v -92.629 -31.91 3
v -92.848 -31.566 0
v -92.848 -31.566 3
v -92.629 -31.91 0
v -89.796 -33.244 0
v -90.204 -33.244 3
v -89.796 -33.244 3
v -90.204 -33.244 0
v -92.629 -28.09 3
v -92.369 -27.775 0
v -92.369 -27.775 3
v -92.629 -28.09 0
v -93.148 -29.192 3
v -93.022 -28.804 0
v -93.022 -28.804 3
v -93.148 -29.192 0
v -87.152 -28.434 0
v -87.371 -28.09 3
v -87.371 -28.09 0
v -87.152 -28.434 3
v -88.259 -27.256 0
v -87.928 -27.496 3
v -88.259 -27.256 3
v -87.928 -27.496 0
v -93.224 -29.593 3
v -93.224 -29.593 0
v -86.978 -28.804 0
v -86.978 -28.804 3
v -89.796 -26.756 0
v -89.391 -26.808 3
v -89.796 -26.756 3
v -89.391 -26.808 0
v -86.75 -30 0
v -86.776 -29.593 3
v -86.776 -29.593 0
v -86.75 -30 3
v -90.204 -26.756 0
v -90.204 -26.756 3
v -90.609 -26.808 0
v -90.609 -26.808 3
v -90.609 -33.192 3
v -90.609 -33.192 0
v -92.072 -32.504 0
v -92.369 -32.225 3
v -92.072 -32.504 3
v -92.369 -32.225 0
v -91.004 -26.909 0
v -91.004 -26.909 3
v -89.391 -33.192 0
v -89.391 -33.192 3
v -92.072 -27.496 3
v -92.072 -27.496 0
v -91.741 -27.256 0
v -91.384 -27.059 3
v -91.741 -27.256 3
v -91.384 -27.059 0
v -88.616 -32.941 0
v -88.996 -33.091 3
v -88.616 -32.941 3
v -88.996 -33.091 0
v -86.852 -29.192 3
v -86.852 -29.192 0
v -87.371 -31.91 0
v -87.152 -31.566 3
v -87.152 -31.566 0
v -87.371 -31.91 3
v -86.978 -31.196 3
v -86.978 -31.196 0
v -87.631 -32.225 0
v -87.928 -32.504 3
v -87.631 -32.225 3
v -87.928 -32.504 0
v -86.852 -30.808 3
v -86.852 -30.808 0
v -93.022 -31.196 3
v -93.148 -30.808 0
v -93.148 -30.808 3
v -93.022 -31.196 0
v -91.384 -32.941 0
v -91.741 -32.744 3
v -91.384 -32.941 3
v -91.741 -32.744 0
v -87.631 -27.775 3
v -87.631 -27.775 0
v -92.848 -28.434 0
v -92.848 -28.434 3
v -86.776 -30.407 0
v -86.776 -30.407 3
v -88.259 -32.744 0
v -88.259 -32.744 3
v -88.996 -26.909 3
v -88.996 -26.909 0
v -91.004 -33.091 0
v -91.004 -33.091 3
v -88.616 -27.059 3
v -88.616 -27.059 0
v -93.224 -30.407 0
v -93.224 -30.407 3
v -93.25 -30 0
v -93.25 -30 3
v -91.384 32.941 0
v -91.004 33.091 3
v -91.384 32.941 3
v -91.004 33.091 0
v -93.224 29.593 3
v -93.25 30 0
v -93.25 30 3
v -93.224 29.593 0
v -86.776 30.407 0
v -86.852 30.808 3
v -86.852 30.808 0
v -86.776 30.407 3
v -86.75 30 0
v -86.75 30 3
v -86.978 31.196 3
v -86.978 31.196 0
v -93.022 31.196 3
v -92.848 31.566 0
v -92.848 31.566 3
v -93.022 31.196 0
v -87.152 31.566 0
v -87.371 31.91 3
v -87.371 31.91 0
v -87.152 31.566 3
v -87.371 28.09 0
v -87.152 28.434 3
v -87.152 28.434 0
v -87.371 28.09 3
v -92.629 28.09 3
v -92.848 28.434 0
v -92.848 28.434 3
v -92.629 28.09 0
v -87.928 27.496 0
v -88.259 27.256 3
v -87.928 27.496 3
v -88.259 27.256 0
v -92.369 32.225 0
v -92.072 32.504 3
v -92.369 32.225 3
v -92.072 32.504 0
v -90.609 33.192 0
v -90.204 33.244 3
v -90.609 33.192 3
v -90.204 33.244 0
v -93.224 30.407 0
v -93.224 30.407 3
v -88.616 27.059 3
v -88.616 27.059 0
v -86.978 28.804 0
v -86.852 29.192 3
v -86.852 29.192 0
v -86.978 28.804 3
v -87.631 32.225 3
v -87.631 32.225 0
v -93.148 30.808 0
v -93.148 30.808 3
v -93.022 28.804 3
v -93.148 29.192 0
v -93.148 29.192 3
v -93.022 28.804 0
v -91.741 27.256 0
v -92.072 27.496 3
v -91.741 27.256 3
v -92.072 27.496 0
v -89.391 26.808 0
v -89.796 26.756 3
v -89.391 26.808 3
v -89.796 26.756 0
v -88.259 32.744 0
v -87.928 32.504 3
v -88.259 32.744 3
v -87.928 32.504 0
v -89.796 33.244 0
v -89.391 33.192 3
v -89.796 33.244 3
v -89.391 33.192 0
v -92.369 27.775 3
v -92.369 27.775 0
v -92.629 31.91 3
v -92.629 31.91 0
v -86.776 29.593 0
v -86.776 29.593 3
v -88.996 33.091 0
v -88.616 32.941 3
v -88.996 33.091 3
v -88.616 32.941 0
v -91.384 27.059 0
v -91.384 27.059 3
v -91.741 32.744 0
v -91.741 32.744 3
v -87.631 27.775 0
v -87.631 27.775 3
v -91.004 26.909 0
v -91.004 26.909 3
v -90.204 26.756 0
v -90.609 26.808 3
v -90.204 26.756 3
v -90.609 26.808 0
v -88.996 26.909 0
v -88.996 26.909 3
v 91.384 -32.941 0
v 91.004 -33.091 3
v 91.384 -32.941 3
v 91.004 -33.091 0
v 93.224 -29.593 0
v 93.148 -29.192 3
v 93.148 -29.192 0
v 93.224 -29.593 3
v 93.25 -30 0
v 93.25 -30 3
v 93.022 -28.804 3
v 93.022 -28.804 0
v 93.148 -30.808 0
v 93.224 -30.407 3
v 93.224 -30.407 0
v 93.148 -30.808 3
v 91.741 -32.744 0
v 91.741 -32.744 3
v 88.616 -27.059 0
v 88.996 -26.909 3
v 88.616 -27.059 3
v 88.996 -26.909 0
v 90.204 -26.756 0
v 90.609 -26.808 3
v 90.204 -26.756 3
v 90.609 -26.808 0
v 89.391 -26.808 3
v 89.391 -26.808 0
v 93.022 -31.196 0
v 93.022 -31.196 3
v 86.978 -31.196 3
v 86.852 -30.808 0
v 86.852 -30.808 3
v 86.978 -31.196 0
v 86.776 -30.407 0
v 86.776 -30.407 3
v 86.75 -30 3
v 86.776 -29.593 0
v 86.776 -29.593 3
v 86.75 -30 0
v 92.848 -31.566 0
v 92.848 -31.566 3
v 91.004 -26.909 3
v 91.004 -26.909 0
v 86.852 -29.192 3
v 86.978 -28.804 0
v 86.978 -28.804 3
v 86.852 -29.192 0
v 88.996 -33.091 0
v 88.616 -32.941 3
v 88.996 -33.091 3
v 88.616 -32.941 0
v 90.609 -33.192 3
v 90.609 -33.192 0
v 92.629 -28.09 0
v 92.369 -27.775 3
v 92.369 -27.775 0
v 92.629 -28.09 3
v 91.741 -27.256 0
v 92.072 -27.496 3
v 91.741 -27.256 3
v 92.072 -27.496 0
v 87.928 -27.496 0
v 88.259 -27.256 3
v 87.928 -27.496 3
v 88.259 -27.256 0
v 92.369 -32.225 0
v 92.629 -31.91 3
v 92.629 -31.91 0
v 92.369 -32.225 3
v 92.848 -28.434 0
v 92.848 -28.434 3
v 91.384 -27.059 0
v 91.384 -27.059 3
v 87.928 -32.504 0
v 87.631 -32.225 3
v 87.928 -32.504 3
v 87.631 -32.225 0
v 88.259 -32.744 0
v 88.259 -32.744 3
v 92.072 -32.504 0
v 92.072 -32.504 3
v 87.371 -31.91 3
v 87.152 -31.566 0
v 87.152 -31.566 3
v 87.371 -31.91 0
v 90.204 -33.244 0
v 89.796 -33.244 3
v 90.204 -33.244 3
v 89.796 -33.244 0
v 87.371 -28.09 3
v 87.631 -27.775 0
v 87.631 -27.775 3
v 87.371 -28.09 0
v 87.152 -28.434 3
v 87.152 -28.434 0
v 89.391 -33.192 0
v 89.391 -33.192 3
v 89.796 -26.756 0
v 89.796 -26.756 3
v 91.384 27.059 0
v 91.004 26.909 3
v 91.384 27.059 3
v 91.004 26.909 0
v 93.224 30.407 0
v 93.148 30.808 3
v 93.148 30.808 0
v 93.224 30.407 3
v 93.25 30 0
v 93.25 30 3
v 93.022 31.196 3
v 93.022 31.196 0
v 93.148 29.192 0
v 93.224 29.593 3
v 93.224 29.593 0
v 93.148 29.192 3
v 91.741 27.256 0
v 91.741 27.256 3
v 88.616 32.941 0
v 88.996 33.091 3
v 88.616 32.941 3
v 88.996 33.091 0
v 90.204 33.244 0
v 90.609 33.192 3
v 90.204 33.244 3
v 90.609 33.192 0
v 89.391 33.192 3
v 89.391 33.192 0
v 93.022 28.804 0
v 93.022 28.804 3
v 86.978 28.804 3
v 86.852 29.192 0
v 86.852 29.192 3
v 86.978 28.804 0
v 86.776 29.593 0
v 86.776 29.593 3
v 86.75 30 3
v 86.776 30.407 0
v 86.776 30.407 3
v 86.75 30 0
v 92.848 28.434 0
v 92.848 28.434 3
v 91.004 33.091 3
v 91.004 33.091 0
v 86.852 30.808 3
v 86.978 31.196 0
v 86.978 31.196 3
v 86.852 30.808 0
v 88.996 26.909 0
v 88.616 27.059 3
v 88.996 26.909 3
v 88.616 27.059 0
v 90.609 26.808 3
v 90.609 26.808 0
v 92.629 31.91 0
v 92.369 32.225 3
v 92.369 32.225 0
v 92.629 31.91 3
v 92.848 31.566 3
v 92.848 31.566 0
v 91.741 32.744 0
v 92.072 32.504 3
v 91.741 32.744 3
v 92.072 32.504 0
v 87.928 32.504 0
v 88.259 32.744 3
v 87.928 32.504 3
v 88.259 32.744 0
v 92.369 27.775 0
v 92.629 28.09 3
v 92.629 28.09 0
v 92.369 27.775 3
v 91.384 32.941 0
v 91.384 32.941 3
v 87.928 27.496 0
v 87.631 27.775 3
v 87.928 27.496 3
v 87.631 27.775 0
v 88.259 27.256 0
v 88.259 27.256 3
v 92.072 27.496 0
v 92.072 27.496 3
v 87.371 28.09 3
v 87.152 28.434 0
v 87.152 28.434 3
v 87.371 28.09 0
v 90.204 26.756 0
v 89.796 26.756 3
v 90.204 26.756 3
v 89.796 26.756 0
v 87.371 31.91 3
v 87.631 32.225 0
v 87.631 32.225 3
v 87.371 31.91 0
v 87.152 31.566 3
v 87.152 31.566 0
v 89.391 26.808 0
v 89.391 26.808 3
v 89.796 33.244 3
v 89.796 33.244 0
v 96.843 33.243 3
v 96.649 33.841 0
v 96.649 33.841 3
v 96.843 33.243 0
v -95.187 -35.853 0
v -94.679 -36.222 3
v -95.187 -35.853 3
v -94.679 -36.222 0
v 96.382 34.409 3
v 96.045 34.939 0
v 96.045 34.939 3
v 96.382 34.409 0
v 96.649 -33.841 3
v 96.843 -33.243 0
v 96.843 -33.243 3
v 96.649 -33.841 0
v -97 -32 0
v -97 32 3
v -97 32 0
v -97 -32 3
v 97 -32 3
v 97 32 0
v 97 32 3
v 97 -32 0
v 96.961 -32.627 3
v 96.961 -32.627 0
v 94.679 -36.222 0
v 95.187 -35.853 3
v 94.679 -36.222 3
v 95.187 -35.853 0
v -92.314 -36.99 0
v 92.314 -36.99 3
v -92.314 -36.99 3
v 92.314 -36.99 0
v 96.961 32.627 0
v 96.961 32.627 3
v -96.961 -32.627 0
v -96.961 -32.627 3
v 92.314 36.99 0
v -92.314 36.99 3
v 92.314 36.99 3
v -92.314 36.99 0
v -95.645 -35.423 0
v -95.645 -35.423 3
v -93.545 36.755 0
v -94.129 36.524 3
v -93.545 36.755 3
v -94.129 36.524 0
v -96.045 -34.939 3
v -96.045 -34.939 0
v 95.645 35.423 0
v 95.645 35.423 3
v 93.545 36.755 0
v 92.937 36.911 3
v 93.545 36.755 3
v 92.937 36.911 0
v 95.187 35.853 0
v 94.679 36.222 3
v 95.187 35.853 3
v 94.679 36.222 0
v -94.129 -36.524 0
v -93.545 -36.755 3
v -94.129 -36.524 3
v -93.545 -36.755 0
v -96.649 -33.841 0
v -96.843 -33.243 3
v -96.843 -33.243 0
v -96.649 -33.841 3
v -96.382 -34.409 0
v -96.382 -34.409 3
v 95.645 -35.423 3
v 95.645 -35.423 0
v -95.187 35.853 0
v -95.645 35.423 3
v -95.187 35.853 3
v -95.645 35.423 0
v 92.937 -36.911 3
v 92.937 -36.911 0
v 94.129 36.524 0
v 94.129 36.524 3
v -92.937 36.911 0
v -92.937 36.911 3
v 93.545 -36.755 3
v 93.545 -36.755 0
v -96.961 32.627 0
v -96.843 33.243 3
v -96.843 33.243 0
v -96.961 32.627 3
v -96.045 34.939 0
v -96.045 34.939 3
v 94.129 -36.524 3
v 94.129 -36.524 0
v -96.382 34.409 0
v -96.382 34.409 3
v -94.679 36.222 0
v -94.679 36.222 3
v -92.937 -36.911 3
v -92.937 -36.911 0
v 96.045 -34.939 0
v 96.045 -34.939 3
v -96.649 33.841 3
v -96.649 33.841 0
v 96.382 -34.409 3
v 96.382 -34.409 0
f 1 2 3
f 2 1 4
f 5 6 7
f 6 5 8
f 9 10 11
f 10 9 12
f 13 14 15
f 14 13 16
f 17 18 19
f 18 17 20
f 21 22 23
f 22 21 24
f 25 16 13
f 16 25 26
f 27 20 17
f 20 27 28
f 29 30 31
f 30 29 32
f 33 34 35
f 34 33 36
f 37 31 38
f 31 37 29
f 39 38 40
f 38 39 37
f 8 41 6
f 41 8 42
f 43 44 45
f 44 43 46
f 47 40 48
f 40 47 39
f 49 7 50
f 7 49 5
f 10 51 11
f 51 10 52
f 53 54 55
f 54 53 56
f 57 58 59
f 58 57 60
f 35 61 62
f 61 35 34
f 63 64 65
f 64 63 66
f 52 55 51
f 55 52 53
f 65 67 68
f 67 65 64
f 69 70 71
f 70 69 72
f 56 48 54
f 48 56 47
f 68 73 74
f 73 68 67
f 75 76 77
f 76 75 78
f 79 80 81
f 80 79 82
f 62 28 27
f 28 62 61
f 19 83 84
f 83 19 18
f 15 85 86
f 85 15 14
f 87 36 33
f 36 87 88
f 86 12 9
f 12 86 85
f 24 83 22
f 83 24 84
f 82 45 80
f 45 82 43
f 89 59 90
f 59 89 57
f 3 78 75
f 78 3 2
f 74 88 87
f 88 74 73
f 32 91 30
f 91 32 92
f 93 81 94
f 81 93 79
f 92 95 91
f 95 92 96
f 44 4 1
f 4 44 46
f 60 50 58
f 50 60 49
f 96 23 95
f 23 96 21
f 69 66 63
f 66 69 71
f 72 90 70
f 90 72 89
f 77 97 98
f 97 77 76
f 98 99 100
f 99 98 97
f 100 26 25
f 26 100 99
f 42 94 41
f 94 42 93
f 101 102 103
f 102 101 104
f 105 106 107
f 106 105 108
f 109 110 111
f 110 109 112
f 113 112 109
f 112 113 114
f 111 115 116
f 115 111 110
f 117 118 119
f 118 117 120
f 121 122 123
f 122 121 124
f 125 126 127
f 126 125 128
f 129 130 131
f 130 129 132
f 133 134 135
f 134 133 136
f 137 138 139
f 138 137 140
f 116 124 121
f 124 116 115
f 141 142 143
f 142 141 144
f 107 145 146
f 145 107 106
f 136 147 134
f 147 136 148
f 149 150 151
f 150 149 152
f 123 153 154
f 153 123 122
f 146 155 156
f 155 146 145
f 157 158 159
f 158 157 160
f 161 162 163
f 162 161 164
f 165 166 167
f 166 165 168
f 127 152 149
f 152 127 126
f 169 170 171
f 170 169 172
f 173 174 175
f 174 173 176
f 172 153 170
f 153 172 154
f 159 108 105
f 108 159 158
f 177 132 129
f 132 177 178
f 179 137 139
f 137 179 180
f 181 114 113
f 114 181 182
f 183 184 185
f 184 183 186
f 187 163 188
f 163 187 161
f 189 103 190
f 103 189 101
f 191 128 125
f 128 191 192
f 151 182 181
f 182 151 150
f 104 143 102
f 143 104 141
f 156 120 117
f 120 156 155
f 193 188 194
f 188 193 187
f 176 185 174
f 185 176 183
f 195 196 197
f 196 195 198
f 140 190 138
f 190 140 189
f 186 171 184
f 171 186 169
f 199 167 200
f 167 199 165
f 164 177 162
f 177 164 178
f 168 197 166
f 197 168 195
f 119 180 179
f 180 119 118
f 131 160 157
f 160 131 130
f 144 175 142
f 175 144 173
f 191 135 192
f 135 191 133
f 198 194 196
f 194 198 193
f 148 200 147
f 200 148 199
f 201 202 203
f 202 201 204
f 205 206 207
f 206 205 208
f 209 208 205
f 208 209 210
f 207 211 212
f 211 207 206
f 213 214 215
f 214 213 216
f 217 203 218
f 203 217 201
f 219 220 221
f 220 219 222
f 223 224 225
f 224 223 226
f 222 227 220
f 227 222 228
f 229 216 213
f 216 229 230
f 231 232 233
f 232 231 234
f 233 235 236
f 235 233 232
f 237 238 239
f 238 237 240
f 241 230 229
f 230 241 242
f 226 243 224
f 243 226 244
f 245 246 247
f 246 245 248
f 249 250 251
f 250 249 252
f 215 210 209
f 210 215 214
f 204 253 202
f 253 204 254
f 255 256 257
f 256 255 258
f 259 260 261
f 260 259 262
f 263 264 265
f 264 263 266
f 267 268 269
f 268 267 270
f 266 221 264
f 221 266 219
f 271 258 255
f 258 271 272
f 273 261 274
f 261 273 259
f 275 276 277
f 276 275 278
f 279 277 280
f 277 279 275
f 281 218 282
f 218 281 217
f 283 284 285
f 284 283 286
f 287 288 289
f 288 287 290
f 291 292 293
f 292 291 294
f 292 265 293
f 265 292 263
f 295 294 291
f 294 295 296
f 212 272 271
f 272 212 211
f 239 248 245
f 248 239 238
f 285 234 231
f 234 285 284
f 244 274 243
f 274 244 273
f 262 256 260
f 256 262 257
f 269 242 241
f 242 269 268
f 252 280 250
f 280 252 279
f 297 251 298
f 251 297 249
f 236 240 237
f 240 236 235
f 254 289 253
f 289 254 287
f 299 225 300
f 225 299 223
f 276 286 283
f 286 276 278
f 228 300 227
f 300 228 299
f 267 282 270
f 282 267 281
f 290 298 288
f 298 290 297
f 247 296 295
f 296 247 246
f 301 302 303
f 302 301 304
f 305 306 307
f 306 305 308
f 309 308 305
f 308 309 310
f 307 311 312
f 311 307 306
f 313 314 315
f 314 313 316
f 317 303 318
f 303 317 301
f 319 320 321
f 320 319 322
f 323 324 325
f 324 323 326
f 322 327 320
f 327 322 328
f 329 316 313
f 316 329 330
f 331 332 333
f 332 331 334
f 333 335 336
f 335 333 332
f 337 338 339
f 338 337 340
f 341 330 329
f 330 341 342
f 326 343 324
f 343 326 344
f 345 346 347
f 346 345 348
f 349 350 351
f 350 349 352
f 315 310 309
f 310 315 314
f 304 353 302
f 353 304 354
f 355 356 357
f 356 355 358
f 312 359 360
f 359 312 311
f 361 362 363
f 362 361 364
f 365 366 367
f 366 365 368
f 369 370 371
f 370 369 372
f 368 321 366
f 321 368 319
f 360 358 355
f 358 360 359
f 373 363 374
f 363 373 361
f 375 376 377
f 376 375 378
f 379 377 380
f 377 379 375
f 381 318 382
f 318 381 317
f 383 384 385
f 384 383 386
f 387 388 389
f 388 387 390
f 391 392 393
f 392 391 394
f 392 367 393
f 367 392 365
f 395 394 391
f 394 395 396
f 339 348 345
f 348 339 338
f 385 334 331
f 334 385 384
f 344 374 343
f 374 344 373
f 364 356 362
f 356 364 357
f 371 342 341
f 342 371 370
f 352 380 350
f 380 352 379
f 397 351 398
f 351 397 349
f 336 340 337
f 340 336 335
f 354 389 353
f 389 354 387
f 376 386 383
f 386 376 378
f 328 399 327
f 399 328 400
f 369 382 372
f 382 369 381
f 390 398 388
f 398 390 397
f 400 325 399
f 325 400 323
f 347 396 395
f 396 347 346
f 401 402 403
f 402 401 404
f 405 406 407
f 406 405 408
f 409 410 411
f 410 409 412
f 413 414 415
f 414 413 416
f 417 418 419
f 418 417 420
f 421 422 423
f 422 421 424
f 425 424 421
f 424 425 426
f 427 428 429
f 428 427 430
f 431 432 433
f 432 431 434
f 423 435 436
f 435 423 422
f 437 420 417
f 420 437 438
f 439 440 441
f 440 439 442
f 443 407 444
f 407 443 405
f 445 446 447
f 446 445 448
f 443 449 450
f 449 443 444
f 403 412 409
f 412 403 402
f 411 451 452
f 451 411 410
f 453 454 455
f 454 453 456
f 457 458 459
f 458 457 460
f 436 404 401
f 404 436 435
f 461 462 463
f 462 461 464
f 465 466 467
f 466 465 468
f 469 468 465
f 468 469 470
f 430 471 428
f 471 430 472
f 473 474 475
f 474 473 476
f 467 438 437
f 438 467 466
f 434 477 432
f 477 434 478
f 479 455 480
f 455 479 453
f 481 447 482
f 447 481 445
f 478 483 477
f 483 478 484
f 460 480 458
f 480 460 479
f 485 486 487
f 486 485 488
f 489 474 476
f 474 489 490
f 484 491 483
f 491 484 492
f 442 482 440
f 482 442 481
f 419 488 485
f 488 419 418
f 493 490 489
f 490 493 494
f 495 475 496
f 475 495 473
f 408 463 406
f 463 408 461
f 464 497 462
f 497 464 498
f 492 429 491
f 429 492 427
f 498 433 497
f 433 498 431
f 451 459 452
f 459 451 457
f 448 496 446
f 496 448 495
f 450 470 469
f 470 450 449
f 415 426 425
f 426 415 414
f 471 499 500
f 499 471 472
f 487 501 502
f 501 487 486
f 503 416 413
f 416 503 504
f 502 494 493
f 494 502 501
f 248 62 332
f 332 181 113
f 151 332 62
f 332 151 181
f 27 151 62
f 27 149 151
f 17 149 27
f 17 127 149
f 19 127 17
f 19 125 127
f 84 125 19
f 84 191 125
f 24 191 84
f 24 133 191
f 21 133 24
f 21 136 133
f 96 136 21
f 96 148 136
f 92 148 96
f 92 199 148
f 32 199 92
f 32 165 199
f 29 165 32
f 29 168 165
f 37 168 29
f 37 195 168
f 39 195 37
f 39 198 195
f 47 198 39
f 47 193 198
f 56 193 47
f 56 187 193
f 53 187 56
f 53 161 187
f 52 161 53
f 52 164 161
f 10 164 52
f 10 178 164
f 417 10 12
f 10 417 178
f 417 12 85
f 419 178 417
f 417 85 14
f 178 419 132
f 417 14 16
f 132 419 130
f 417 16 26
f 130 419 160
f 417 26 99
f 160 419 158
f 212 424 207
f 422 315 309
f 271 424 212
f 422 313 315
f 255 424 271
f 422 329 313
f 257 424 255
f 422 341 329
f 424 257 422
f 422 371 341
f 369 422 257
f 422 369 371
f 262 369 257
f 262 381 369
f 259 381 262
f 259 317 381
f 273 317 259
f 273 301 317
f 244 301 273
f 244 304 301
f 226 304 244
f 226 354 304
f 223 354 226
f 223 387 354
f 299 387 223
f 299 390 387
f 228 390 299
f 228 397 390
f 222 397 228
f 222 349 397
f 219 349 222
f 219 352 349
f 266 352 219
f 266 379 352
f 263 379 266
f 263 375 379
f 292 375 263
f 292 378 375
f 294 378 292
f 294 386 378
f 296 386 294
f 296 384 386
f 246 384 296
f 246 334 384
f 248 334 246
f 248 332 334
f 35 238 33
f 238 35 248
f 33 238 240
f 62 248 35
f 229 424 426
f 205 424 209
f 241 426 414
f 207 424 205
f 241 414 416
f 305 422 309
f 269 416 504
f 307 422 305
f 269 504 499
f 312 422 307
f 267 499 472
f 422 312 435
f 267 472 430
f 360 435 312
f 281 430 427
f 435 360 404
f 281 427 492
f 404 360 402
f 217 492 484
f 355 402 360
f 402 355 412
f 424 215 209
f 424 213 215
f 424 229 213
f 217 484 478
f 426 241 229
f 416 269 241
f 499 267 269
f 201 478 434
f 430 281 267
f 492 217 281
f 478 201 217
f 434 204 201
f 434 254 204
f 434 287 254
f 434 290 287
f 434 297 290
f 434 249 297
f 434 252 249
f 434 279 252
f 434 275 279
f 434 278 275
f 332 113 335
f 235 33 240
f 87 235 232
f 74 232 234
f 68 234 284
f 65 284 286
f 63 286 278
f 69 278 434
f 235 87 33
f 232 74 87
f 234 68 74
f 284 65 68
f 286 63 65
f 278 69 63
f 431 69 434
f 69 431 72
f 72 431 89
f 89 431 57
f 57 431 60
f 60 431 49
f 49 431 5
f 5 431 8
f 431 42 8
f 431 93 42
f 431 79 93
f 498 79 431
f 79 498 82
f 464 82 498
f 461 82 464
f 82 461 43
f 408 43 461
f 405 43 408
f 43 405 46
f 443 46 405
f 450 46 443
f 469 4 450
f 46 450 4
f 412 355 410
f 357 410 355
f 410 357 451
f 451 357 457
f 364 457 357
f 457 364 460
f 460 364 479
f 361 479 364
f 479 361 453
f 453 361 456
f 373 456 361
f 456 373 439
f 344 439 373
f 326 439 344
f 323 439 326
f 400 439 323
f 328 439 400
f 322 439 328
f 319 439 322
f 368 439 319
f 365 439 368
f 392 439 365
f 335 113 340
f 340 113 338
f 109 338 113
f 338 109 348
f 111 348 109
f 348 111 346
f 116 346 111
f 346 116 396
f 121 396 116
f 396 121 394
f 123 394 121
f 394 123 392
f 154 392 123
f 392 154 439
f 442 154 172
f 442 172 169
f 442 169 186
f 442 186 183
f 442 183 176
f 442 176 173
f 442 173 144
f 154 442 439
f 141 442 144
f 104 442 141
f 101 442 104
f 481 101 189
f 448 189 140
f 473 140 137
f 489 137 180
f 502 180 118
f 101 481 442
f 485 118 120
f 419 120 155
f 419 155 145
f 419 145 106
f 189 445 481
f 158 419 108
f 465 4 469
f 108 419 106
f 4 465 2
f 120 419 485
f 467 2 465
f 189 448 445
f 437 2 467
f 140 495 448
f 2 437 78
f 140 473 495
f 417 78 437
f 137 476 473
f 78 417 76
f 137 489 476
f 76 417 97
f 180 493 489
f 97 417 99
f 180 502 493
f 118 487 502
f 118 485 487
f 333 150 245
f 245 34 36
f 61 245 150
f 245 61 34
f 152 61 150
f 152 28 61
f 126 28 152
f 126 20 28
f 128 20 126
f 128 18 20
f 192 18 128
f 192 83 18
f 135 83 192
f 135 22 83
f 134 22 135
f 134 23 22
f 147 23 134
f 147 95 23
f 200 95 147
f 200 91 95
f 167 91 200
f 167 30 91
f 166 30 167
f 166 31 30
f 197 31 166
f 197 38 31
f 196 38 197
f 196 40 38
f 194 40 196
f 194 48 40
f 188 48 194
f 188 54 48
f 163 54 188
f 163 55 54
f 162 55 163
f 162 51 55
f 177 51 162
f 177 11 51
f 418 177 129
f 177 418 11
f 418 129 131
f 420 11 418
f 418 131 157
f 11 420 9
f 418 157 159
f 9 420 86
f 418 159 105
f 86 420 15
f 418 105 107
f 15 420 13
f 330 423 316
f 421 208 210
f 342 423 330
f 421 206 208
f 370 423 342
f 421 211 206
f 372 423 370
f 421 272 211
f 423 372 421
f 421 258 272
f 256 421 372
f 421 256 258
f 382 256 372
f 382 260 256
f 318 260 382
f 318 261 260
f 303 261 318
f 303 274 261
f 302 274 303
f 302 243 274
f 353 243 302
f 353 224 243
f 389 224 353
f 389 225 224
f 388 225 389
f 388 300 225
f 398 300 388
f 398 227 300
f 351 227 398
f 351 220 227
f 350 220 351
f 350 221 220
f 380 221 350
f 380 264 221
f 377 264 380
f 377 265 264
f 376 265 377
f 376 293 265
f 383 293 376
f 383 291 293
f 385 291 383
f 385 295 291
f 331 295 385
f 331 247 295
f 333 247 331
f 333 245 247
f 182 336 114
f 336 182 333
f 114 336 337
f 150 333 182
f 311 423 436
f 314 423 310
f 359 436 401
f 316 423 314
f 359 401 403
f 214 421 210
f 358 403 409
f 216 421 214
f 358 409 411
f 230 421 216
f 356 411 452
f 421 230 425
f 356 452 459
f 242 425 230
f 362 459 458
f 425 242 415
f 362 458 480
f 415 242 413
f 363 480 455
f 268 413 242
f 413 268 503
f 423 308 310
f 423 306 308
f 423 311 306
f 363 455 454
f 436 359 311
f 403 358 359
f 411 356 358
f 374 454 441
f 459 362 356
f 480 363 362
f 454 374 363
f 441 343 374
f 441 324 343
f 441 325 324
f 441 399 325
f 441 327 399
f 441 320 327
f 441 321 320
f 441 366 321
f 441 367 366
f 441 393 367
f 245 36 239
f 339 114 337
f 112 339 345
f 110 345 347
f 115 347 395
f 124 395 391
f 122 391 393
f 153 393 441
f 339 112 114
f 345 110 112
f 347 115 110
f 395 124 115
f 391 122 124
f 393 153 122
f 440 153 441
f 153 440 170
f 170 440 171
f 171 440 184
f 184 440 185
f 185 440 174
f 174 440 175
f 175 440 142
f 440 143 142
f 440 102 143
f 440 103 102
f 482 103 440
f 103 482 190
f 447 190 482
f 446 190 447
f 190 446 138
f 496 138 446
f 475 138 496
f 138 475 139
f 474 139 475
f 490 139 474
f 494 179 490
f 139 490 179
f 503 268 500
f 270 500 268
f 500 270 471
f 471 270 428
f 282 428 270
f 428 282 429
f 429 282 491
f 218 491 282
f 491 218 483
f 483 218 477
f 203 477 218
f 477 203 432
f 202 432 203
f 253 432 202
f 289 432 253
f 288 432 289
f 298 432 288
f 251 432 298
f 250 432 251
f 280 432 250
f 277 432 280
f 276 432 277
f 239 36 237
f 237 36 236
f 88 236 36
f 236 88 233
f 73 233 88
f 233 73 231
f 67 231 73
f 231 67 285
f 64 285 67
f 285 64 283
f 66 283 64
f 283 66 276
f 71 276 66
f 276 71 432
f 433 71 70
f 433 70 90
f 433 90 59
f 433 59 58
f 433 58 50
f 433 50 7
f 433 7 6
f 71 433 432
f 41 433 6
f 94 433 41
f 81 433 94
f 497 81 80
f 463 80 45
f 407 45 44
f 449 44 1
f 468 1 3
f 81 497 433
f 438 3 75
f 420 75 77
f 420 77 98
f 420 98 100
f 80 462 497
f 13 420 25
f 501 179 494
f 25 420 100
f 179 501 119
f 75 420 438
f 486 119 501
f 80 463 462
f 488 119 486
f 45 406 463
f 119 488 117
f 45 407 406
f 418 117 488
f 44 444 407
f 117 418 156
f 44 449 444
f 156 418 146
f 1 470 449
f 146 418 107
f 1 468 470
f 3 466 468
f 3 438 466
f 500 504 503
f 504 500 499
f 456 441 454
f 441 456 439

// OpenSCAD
$fn = 50;


difference() {
	union() {
		hull() {
			translate(v = [-92.0000000000, 32.0000000000, 0]) {
				cylinder(h = 3, r = 5);
			}
			translate(v = [92.0000000000, 32.0000000000, 0]) {
				cylinder(h = 3, r = 5);
			}
			translate(v = [-92.0000000000, -32.0000000000, 0]) {
				cylinder(h = 3, r = 5);
			}
			translate(v = [92.0000000000, -32.0000000000, 0]) {
				cylinder(h = 3, r = 5);
			}
		}
	}
	union() {
		translate(v = [-90.0000000000, -30.0000000000, -100.0000000000]) {
			cylinder(h = 200, r = 3.2500000000);
		}
		translate(v = [-90.0000000000, 30.0000000000, -100.0000000000]) {
			cylinder(h = 200, r = 3.2500000000);
		}
		translate(v = [90.0000000000, -30.0000000000, -100.0000000000]) {
			cylinder(h = 200, r = 3.2500000000);
		}
		translate(v = [90.0000000000, 30.0000000000, -100.0000000000]) {
			cylinder(h = 200, r = 3.2500000000);
		}
	}
}
